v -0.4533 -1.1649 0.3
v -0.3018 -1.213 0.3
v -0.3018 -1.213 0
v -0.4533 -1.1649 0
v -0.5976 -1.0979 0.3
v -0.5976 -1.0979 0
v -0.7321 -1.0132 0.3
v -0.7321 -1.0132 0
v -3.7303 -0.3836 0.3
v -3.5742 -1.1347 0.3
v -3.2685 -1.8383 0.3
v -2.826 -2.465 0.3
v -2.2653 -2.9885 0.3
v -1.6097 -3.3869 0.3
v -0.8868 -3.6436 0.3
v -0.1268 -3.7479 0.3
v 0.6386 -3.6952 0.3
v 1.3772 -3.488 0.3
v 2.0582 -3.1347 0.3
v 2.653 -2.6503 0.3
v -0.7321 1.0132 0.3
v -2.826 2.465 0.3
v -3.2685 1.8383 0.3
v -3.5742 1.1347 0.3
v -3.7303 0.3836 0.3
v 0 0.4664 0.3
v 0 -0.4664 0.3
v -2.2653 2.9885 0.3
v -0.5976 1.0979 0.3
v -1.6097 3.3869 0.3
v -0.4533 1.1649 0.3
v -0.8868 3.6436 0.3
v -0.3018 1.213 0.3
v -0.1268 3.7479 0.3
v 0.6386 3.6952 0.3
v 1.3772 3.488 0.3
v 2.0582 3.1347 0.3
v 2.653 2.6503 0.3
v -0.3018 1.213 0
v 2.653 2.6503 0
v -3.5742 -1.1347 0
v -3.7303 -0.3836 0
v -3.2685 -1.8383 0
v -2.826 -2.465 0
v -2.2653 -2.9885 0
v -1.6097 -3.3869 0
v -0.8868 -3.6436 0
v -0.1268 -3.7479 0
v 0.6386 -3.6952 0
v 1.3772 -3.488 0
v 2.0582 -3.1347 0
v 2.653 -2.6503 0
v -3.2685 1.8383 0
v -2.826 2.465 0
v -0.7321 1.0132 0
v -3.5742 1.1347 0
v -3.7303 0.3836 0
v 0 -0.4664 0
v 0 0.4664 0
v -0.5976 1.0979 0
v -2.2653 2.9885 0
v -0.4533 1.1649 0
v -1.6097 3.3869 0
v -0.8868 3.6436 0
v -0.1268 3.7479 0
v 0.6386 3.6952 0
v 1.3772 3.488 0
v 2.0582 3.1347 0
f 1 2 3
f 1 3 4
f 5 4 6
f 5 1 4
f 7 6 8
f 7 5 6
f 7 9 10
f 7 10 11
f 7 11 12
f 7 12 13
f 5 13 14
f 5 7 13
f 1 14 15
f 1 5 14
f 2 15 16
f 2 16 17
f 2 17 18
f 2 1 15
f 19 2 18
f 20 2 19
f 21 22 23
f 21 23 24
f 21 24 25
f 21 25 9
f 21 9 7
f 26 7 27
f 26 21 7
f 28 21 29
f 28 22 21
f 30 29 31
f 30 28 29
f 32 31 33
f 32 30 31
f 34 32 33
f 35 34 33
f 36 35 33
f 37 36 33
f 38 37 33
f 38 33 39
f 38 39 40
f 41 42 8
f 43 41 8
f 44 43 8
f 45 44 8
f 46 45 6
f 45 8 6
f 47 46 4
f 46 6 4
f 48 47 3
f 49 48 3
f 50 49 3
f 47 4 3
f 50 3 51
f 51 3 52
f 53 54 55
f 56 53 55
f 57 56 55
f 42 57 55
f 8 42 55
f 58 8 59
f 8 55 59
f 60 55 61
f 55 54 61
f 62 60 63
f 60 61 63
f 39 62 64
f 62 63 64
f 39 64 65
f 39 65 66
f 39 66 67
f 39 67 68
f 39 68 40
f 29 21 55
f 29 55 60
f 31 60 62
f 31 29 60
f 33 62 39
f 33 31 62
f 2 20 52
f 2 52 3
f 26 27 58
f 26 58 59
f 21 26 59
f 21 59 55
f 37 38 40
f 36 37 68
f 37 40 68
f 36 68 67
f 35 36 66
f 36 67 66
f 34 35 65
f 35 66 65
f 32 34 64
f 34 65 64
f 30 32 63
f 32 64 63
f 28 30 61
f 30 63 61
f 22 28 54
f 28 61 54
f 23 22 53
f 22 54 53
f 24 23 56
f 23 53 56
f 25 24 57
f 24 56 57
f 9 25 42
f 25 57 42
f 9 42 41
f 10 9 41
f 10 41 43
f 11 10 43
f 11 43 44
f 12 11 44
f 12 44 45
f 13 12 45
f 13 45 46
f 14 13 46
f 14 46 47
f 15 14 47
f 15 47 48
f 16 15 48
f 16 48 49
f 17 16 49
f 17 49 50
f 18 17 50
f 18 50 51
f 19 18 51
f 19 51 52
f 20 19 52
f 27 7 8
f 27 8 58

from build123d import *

# Parameters (mm, degrees)
SKETCH1_R           = 3.75
BOSS_EXTRUDE1_DEPTH = 0.3
CUT_EXTRUDE2_DEPTH  = 1.3


with BuildPart() as part:
    # Sketch1 → Boss-Extrude1 (new body)
    with BuildSketch(Plane.XY):
        Circle(SKETCH1_R)
    extrude(amount=BOSS_EXTRUDE1_DEPTH)

    # Sketch2 → Cut-Extrude2 (cut, through all)
    with BuildSketch(Plane.XY.offset(0.3)):
        with BuildLine():
            Line((0, 0.466411964), (-0.73212486, 1.013160002))
            ThreePointArc((-0.73212486, 1.013160002), (-0.526515635, 1.133702468), (-0.301764614, 1.21302849))
            Line((-0.301764614, 1.21302849), (2.653016072, 2.650284083))
            ThreePointArc((2.653016072, 2.650284083), (3.75, 0), (2.653016072, -2.650284083))
            Line((2.653016072, -2.650284083), (-0.301764614, -1.21302849))
            ThreePointArc((-0.301764614, -1.21302849), (-0.526515635, -1.133702468), (-0.73212486, -1.013160002))
            Line((-0.73212486, -1.013160002), (0, -0.466411964))
            Line((0, -0.466411964), (0, 0.466411964))
        make_face()
    extrude(amount=-CUT_EXTRUDE2_DEPTH, mode=Mode.SUBTRACT)


solid = part.part
